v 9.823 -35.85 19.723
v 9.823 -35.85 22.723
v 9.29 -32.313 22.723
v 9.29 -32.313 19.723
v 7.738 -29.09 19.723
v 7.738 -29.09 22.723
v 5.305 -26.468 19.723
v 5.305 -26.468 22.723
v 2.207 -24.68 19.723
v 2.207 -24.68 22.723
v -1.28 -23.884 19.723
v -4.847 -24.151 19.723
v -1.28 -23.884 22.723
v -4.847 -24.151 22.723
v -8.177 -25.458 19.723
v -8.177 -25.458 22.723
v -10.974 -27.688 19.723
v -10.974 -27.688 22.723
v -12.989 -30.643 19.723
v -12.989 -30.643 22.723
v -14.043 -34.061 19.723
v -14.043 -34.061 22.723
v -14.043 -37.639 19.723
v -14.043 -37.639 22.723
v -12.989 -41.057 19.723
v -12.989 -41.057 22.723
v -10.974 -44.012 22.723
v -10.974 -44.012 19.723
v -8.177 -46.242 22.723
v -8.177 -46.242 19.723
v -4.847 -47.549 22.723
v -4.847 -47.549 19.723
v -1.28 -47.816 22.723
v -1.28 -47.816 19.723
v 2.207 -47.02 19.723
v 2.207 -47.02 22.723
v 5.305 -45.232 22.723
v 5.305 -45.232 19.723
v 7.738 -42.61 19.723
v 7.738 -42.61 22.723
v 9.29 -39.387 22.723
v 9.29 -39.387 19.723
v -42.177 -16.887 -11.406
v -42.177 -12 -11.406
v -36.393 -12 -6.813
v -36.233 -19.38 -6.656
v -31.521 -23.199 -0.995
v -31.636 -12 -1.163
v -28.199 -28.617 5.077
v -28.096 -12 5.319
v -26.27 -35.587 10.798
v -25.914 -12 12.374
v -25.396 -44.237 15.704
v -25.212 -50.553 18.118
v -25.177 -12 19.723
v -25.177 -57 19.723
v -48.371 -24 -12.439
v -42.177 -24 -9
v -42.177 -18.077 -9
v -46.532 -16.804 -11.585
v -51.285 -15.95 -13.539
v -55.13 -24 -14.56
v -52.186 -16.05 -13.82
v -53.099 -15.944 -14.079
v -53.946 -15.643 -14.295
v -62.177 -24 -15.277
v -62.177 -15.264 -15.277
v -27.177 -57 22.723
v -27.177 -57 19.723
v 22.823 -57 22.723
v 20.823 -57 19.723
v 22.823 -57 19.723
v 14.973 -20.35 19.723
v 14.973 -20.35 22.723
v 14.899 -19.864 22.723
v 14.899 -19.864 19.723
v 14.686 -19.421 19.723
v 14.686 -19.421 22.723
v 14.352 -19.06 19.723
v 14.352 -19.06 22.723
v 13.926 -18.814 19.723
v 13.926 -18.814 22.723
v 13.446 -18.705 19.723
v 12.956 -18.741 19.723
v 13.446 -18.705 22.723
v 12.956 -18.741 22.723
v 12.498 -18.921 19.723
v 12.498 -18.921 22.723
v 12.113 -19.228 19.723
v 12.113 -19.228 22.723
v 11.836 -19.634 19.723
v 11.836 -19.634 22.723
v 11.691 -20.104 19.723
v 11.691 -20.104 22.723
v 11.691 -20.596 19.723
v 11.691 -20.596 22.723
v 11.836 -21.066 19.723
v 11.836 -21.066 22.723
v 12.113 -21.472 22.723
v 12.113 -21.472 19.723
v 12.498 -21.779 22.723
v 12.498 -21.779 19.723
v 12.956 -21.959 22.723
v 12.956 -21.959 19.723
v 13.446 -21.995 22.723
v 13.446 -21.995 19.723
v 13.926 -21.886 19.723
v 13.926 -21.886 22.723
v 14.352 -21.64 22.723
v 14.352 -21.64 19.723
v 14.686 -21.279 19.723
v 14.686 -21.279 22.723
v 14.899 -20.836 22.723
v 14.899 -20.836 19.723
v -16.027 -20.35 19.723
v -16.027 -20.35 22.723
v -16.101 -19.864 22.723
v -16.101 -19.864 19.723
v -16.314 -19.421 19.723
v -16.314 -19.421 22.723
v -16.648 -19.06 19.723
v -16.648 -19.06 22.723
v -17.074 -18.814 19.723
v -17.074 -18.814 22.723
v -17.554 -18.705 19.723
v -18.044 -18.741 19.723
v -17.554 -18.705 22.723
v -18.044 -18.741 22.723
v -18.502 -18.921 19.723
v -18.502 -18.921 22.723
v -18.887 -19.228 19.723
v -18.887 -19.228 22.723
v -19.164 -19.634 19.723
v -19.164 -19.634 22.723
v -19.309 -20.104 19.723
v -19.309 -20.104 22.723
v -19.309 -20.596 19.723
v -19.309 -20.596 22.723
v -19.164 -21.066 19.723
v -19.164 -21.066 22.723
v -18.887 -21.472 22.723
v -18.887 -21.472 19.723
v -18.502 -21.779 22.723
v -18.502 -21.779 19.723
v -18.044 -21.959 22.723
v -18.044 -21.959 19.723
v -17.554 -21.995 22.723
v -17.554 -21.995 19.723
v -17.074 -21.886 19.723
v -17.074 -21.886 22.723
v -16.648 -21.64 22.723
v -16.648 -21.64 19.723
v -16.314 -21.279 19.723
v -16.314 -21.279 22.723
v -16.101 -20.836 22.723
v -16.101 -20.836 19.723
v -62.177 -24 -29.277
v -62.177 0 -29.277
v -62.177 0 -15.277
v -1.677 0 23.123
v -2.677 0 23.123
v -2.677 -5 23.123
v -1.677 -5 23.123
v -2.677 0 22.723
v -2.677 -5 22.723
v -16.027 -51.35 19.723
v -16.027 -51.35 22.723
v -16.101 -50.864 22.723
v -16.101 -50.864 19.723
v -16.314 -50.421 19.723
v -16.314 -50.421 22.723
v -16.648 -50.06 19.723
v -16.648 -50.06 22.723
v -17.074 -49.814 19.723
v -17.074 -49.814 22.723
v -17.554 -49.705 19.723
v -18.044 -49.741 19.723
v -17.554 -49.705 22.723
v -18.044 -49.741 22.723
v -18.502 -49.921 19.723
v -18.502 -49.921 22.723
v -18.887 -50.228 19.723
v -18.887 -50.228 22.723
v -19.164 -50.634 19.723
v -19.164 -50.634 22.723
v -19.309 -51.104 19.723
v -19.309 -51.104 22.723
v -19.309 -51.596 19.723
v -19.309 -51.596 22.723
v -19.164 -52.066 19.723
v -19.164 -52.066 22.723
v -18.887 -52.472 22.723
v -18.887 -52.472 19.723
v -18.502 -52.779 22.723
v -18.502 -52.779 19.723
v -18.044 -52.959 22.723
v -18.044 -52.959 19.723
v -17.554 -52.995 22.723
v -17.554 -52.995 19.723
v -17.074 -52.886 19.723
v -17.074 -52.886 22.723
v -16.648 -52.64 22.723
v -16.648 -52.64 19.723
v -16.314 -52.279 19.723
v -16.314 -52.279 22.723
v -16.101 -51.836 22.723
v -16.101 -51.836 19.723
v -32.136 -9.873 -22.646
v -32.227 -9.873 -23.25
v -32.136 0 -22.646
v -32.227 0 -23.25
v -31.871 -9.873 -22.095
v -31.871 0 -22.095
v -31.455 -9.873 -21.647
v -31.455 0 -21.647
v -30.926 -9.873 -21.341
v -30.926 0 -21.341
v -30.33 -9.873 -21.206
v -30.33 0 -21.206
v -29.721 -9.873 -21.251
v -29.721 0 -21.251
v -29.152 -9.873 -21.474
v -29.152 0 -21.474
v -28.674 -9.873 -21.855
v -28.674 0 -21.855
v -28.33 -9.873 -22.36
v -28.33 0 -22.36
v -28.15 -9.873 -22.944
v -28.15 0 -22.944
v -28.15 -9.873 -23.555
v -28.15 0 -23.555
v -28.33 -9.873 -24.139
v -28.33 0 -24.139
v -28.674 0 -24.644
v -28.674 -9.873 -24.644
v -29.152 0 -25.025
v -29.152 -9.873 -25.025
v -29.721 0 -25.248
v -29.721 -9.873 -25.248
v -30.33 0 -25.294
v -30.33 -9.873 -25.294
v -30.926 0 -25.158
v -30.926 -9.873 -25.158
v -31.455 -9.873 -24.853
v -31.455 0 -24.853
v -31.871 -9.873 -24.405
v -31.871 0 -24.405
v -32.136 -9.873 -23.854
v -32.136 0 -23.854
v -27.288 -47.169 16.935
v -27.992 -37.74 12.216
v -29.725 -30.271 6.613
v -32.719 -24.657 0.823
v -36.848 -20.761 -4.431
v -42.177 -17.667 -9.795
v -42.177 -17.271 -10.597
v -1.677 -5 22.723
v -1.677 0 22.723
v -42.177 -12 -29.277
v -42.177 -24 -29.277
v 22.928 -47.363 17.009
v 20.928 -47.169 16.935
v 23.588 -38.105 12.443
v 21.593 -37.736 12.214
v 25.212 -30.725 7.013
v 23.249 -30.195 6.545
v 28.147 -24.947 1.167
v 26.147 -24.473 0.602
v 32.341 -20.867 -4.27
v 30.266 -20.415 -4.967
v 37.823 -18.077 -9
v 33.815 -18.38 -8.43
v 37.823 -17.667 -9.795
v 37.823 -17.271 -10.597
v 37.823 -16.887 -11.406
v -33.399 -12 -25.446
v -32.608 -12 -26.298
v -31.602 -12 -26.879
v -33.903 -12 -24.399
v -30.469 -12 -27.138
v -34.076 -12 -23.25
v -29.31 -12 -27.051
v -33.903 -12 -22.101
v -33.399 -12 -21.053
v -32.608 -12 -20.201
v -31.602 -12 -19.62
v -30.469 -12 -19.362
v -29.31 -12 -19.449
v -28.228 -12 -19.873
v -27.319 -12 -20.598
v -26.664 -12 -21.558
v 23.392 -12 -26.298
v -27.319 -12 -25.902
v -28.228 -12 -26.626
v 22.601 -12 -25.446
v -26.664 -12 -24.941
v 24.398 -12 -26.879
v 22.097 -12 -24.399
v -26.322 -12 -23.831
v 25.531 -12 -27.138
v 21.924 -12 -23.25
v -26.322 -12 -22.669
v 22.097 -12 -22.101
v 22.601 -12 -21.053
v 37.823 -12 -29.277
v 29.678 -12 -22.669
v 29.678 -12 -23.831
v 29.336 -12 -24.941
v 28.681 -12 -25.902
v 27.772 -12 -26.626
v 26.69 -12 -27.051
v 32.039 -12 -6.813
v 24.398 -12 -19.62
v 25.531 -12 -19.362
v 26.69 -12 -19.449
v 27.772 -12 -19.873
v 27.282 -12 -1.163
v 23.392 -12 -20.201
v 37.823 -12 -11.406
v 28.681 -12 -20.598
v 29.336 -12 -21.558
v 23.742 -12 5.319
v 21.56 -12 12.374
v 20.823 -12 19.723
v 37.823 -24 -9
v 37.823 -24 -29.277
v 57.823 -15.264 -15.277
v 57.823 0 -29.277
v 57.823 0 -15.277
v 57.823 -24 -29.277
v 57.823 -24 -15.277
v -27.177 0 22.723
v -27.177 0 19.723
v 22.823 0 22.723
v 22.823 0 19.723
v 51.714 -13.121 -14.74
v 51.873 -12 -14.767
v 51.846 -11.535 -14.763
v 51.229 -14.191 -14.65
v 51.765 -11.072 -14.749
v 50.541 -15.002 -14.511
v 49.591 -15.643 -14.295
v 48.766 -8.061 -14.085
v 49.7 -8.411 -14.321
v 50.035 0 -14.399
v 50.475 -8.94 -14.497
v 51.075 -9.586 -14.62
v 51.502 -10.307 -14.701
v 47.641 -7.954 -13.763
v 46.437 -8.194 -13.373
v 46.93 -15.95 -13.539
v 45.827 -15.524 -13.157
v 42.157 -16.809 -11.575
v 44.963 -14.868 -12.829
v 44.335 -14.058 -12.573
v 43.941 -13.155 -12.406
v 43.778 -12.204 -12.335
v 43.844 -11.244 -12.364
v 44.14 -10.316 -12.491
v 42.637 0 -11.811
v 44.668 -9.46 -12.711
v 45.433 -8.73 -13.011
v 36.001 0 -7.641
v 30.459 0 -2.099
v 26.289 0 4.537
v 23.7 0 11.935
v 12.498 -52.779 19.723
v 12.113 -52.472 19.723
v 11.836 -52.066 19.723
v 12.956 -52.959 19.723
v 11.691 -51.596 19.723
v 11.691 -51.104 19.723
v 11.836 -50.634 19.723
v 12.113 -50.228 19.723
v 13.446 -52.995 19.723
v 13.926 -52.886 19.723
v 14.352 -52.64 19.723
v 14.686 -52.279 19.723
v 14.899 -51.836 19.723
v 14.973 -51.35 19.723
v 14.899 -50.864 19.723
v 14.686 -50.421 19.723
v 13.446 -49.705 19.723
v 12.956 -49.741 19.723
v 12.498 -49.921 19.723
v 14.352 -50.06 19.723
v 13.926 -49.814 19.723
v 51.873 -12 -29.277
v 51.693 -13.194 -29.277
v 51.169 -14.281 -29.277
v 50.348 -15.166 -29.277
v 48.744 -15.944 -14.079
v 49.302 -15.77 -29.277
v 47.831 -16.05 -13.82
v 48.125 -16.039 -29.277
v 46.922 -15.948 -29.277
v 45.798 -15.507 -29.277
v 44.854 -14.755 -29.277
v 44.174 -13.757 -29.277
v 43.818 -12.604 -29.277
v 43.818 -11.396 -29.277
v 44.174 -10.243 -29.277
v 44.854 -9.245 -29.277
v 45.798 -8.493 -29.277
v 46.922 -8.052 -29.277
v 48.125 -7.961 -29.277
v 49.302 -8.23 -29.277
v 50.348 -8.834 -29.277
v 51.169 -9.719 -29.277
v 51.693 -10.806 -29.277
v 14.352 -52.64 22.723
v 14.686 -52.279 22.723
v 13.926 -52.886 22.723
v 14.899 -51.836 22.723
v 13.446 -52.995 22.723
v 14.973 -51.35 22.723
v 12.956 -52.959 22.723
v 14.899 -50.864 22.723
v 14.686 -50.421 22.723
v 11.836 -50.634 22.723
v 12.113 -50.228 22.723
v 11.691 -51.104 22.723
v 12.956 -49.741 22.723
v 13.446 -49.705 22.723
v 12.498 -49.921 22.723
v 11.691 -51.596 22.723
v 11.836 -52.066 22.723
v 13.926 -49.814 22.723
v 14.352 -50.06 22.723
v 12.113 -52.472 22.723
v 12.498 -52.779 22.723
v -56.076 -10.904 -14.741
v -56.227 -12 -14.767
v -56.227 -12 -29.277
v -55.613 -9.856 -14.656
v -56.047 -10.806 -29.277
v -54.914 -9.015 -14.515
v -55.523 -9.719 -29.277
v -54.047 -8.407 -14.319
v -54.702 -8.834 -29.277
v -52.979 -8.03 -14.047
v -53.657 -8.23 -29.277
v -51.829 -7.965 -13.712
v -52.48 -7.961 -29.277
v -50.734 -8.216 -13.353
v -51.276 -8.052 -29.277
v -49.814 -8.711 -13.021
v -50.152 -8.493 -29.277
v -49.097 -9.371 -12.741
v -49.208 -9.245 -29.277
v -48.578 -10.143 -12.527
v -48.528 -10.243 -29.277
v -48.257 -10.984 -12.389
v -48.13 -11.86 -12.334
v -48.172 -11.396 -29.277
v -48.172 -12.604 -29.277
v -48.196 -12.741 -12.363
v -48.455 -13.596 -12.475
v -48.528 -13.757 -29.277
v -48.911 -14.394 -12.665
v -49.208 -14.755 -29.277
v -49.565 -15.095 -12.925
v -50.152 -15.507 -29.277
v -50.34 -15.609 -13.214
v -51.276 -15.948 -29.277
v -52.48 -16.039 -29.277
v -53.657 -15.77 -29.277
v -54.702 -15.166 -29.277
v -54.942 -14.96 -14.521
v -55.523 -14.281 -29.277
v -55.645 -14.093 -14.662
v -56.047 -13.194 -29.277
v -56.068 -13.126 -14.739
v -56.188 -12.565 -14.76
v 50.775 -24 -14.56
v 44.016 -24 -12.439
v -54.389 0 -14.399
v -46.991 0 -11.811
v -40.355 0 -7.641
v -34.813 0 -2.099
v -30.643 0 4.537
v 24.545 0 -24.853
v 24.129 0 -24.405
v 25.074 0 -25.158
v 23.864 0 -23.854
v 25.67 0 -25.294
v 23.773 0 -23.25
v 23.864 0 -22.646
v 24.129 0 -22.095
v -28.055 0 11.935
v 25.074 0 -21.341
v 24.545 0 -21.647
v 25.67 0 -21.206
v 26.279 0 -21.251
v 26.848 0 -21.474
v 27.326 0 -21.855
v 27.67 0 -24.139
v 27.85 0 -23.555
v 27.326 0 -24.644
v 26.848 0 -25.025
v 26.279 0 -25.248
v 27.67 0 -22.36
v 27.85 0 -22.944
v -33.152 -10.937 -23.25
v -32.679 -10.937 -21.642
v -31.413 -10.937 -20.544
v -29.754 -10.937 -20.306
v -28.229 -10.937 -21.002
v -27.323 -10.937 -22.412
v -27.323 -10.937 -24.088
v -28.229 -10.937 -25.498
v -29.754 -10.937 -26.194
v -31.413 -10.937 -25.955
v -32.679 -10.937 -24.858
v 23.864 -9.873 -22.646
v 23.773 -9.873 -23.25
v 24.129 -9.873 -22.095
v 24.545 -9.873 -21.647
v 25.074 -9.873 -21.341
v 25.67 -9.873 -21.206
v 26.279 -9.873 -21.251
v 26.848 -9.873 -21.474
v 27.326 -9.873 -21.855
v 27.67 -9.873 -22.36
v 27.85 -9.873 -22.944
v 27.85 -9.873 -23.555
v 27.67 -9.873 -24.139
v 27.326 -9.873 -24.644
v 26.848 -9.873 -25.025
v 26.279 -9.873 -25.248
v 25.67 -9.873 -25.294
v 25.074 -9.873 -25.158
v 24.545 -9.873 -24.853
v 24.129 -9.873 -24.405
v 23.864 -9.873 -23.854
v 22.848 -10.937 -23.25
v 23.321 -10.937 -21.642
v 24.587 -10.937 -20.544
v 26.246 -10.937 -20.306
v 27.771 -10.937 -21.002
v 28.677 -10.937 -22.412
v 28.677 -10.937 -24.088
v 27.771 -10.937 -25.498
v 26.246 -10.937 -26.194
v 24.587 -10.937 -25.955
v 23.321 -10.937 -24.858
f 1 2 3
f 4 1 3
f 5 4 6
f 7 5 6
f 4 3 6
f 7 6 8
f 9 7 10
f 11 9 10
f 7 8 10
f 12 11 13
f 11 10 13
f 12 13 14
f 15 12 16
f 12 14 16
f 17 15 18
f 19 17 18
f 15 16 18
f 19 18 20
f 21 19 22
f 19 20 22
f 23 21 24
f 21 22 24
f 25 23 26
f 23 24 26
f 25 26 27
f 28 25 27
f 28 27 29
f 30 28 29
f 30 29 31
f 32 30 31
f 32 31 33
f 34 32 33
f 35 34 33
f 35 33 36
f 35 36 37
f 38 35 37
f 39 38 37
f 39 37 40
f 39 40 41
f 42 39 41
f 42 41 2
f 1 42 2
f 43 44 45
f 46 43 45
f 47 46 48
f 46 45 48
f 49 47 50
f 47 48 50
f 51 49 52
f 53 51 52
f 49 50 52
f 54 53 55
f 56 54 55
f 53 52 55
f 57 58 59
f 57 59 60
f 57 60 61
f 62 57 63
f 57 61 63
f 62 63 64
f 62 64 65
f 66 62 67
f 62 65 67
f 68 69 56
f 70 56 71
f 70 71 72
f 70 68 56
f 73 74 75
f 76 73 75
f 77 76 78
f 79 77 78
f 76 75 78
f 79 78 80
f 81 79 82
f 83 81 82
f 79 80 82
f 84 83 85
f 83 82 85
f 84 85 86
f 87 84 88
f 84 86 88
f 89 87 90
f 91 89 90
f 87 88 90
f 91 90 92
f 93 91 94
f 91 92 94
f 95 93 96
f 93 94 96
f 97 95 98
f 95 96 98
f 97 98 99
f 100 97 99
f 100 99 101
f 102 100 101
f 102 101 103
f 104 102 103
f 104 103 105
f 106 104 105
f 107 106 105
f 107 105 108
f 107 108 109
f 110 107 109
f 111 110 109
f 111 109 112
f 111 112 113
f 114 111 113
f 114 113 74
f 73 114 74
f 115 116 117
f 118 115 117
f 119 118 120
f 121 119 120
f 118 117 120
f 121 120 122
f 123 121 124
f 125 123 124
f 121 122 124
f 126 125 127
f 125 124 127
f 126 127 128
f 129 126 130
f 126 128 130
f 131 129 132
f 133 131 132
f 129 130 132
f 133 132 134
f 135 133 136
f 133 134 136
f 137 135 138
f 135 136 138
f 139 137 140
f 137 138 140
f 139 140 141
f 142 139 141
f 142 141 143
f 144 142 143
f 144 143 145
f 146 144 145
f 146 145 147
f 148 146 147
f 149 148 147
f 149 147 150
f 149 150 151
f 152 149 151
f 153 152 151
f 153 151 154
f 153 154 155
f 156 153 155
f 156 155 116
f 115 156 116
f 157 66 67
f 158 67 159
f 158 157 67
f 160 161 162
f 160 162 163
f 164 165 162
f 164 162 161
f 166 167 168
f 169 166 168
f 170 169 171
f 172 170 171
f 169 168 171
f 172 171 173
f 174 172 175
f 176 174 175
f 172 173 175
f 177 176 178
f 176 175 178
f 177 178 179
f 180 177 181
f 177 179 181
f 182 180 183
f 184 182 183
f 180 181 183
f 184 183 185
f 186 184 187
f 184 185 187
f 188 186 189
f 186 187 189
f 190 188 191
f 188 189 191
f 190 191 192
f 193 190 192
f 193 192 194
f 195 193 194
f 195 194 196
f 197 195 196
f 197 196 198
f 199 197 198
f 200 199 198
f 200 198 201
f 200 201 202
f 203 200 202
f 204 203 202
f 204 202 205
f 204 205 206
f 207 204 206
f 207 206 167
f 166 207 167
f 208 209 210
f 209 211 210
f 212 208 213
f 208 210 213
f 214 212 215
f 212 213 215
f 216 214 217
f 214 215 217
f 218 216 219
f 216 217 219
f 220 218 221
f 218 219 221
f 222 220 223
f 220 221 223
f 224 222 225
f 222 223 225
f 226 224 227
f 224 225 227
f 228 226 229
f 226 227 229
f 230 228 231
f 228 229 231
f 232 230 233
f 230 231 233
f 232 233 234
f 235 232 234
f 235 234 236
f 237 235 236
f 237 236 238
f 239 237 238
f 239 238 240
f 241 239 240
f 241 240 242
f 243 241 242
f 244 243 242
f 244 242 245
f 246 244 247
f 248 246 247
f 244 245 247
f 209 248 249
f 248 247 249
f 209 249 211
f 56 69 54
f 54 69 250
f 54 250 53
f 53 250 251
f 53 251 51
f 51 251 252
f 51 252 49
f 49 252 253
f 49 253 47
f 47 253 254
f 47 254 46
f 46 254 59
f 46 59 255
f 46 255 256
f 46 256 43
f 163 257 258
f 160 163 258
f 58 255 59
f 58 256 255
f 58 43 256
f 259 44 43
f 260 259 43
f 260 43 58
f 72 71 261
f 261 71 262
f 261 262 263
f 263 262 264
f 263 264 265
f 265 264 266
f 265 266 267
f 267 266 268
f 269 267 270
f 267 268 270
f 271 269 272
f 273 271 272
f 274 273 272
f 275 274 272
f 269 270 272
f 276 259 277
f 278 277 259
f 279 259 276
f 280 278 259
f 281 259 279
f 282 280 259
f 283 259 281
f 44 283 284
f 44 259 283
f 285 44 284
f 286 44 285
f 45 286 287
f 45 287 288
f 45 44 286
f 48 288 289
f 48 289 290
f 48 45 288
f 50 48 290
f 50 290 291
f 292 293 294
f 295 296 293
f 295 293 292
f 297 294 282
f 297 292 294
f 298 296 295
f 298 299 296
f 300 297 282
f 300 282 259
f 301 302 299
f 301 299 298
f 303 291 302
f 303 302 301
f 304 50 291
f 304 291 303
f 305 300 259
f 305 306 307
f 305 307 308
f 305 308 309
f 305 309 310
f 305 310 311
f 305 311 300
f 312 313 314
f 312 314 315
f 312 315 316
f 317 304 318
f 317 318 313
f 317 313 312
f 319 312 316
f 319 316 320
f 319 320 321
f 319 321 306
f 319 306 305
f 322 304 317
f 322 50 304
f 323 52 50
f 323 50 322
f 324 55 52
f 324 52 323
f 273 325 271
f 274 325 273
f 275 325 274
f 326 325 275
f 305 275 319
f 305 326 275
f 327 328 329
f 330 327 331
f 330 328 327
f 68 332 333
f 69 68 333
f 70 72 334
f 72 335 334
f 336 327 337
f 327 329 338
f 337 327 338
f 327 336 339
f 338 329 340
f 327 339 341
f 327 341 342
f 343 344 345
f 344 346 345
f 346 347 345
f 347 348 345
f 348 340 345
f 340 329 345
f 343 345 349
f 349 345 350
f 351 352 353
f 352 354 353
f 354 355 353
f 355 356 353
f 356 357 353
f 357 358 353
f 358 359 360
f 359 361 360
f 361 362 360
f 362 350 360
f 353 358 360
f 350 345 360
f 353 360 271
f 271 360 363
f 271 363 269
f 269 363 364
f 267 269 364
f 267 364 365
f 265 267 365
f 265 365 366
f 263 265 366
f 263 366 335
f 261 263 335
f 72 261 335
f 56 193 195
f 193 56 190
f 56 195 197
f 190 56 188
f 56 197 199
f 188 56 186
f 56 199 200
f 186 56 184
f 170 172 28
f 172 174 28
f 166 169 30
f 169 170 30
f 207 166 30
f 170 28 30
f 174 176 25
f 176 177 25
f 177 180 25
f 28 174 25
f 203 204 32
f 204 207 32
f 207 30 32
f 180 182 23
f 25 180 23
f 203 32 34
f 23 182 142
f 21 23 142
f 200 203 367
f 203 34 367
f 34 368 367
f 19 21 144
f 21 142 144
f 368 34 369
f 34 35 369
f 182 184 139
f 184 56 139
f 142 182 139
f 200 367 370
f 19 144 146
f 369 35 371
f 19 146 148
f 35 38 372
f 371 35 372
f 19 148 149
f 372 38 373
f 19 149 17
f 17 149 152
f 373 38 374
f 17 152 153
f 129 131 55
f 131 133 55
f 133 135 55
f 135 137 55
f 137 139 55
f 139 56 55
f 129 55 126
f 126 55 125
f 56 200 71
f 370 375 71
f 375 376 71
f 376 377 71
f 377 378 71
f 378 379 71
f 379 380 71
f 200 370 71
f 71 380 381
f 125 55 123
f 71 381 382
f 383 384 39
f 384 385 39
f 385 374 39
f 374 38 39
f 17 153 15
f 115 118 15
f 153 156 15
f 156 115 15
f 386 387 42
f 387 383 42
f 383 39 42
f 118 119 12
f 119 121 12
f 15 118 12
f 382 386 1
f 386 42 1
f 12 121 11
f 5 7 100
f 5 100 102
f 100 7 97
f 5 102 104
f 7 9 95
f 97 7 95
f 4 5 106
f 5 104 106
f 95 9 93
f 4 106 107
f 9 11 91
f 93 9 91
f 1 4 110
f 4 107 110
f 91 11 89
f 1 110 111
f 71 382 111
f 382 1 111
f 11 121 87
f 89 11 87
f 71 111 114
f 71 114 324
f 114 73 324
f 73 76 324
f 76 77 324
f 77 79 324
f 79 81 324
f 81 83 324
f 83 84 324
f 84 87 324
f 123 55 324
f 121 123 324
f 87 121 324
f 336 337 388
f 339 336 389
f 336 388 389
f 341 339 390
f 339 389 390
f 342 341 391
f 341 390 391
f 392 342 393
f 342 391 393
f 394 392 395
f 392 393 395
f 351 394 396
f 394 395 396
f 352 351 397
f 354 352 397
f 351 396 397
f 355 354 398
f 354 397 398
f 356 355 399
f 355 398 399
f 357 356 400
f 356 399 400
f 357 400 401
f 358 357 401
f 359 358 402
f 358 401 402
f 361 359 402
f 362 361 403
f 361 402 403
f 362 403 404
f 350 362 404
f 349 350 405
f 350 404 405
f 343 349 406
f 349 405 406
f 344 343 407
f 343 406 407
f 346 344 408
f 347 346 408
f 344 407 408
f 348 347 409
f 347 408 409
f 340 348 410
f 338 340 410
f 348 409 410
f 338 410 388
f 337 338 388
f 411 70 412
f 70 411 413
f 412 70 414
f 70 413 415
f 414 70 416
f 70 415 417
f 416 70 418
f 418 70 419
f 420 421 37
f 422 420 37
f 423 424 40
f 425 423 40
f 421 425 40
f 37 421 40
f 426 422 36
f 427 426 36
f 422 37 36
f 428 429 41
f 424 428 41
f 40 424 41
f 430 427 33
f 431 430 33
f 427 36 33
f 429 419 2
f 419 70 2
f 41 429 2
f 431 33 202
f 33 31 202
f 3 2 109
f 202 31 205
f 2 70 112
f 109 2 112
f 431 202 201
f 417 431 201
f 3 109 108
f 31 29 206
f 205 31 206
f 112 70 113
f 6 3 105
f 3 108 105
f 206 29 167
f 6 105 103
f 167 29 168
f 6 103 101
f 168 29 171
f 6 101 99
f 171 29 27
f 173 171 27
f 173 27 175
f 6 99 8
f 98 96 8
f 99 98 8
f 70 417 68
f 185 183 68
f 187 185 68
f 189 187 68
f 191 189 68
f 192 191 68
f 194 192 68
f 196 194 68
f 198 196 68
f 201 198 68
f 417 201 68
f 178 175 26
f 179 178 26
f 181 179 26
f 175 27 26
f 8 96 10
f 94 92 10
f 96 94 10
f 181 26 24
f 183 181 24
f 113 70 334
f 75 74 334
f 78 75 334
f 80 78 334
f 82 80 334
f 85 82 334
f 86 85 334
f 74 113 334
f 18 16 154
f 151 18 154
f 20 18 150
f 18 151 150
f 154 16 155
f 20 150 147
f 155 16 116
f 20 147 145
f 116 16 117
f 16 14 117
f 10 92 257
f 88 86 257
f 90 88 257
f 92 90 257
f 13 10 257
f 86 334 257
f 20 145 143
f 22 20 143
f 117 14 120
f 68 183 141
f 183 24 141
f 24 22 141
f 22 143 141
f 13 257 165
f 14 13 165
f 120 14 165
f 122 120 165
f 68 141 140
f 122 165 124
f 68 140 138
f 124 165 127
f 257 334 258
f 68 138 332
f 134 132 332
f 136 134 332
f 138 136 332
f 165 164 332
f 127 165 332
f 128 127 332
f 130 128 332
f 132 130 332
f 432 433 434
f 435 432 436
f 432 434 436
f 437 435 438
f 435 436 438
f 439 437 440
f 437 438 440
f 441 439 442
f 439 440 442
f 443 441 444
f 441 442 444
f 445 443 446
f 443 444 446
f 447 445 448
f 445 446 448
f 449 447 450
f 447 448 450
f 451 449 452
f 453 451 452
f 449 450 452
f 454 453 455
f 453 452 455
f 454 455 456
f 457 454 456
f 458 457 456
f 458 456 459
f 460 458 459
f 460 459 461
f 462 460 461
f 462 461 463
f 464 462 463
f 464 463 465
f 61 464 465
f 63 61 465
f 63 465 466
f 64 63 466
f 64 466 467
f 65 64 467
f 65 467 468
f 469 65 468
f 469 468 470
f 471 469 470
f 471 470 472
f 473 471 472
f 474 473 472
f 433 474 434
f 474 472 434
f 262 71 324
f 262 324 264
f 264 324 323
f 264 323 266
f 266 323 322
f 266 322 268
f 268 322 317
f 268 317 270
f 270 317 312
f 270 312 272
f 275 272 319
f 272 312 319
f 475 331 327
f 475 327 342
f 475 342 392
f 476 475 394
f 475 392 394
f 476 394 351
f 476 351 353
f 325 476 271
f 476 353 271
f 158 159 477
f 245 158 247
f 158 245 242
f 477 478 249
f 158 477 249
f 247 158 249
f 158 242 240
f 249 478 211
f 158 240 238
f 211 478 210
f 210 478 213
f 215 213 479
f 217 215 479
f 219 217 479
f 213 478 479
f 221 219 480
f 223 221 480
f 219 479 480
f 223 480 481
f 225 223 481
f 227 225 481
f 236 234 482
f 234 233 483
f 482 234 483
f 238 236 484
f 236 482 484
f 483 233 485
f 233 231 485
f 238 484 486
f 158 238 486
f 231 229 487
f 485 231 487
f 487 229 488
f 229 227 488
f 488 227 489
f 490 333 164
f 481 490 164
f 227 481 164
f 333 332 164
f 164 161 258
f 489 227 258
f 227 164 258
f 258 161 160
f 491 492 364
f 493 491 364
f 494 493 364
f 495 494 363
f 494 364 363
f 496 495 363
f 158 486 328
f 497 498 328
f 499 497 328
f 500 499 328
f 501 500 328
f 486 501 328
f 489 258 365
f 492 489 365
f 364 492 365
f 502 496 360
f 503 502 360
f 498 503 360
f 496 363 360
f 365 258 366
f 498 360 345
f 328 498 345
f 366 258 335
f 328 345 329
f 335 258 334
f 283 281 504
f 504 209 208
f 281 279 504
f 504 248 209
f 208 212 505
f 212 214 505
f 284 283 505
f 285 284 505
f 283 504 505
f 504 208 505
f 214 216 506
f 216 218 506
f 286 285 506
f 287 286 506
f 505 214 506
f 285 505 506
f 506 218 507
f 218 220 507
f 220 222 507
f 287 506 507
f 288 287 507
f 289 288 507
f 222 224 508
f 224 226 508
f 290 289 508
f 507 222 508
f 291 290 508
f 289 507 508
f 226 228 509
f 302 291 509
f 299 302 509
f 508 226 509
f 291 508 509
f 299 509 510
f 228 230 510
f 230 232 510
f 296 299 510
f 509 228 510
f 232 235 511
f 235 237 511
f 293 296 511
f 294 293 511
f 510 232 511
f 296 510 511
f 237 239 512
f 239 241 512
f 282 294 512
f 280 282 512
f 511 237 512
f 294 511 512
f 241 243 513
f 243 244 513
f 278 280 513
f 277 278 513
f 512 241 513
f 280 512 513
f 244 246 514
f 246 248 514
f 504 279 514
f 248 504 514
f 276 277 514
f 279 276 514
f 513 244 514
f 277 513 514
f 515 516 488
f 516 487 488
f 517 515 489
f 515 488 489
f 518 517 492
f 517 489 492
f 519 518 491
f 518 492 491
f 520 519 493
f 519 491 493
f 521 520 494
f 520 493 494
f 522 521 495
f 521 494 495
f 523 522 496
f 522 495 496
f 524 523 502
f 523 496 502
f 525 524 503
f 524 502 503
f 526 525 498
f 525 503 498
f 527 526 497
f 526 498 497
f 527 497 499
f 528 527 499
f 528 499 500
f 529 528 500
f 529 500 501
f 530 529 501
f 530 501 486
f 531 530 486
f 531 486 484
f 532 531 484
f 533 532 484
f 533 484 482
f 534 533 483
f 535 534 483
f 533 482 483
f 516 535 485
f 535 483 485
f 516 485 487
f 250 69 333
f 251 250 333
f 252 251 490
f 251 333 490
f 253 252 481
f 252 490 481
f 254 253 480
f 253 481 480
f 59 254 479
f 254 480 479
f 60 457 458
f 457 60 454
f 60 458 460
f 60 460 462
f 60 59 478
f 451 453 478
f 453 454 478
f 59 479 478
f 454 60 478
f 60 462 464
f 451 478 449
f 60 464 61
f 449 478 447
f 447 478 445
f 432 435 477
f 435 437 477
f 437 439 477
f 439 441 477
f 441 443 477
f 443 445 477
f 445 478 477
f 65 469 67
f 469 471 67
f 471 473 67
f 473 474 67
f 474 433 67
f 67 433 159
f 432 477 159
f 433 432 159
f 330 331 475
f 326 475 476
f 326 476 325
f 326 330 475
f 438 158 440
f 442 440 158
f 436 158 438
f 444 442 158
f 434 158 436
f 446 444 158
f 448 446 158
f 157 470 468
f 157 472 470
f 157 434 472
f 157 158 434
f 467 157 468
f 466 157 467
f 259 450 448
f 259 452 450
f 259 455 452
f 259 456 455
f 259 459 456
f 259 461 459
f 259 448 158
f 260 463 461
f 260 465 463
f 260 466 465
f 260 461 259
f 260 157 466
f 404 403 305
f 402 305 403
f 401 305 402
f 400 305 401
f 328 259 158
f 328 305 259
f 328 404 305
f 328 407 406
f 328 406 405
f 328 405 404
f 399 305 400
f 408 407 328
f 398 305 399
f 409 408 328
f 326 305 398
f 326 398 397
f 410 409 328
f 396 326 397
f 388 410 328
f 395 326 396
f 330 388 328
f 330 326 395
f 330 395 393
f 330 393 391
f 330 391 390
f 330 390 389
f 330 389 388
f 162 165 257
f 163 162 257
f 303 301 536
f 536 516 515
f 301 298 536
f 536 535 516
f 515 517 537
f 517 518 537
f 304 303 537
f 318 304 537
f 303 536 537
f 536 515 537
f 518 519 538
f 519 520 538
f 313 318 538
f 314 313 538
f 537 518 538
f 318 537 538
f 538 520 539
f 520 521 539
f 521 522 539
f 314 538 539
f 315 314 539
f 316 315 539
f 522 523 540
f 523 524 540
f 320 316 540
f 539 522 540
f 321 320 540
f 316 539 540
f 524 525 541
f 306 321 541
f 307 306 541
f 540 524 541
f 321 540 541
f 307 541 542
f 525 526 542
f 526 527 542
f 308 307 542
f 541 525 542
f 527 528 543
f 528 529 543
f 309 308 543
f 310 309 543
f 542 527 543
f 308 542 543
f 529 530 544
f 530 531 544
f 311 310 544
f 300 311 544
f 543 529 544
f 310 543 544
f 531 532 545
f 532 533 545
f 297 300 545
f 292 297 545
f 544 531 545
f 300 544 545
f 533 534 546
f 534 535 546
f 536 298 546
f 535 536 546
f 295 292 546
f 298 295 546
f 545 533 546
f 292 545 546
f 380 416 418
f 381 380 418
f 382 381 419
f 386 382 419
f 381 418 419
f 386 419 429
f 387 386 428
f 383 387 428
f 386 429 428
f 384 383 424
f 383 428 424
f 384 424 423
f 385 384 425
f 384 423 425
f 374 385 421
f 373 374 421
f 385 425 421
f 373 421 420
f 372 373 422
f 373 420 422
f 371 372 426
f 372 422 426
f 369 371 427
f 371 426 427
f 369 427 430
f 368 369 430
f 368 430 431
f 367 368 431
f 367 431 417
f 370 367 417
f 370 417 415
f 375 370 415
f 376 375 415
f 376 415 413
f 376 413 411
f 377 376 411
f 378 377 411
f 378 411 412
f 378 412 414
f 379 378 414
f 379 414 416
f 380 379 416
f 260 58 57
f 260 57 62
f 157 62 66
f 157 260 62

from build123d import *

# Parameters (mm, degrees)
F0_W           = 50
F0_H           = 3
F1_DEPTH       = 12
F3_DEPTH       = 45
F5_DEPTH       = 120.001
F6_R           = 12
F6_R_2         = 1.65
F7_DEPTH       = 25
F9_D           = 4.1000000042
F9_CSINK_D     = 7.7978
F9_CSINK_ANGLE = 82
F10_W          = 1
F10_H          = 5
F11_DEPTH      = 0.4
F13_END_RADIUS = 35
F13_REACH      = 75.7248075794
F14_END_RADIUS = 35
F14_REACH      = 75.7248075794
F15_DEPTH      = 25


with BuildPart() as f1:
    # F0 (on Front) → F1 (new body)
    with BuildSketch(Plane.XZ):
        with BuildLine():
            Line((22.8227958083, 19.723181963), (-27.1772041917, 19.723181963))
            ThreePointArc((-27.1772041917, 19.723181963), (-37.4284668502, -5.0255553786), (-62.1772041917, -15.276818037))
            Line((-62.1772041917, -15.276818037), (-62.1772041917, -29.276818037))
            Line((-62.1772041917, -29.276818037), (57.8227958083, -29.276818037))
            Line((57.8227958083, -29.276818037), (57.8227958083, -15.276818037))
            ThreePointArc((57.8227958083, -15.276818037), (33.0740584668, -5.0255553786), (22.8227958083, 19.723181963))
        make_face()
        with Locations((-2.1772041917, 21.223181963)):
            Rectangle(F0_W, F0_H)
    extrude(amount=F1_DEPTH)

    # F2 (on face) → F3 (join)
    with BuildSketch(Plane.XZ.offset(12)):
        with BuildLine():
            Line((-25.1772041917, 19.723181963), (-27.1772041917, 19.723181963))
            ThreePointArc((-27.1772041917, 19.723181963), (-37.4284668502, -5.0255553786), (-62.1772041917, -15.276818037))
            Line((-62.1772041917, -15.276818037), (-62.1772041917, -29.276818037))
            Line((-62.1772041917, -29.276818037), (-60.1772041917, -29.276818037))
            Line((-60.1772041917, -29.276818037), (-60.1772041917, -17.2227244409))
            ThreePointArc((-60.1772041917, -17.2227244409), (-35.3164521546, -5.722839337), (-25.1772041917, 19.723181963))
        make_face()
        Polygon((-27.1772041917, 22.723181963), (-27.1772041917, 19.723181963), (-25.1772041917, 19.723181963), (20.8227958083, 19.723181963), (22.8227958083, 19.723181963), (22.8227958083, 22.723181963), align=None)
        with BuildLine():
            Line((22.8227958083, 19.723181963), (20.8227958083, 19.723181963))
            ThreePointArc((20.8227958083, 19.723181963), (30.9620437712, -5.722839337), (55.8227958083, -17.2227244409))
            Line((55.8227958083, -17.2227244409), (55.8227958083, -29.276818037))
            Line((55.8227958083, -29.276818037), (57.8227958083, -29.276818037))
            Line((57.8227958083, -29.276818037), (57.8227958083, -15.276818037))
            ThreePointArc((57.8227958083, -15.276818037), (33.0740584668, -5.0255553786), (22.8227958083, 19.723181963))
        make_face()
    extrude(amount=F3_DEPTH)

    # F4 (on face) → F5 (cut, through all)
    with BuildSketch(Plane(origin=(-62.1772041917, 0, 0), x_dir=(0, -1, 0), z_dir=(-1, 0, 0))):
        with BuildLine():
            Line((57, -15.276818037), (57, 19.723181963))
            ThreePointArc((57, 19.723181963), (26.3280584166, 2.7280262742), (12, -29.276818037))
            Line((12, -29.276818037), (57, -29.276818037))
            Line((57, -29.276818037), (57, -15.276818037))
        make_face()
    extrude(amount=-F5_DEPTH, mode=Mode.SUBTRACT)

    # F6 (on face) → F7 (cut)
    with BuildSketch(Plane.XY.offset(22.723181963)):
        with Locations((-2.1772041917, -35.85)):
            Circle(F6_R)
        with Locations((-17.6772041917, -51.35)):
            Circle(F6_R_2)
        with Locations((-17.6772041917, -20.35)):
            Circle(F6_R_2)
        with Locations((13.3227958083, -51.35)):
            Circle(F6_R_2)
        with Locations((13.3227958083, -20.35)):
            Circle(F6_R_2)
    extrude(amount=-F7_DEPTH, mode=Mode.SUBTRACT)

    # F9 (through all)
    with Locations(Plane.XZ.offset(12)):
        with Locations((-30.1772041917, -23.2497712389), (25.8227958083, -23.2497712389)):
            CounterSinkHole(F9_D / 2, F9_CSINK_D / 2, counter_sink_angle=F9_CSINK_ANGLE)

    # F10 (on face) → F11 (join)
    with BuildSketch(Plane.XY.offset(22.723181963)):
        with Locations((-2.1772041917, -2.5)):
            Rectangle(F10_W, F10_H)
    extrude(amount=F11_DEPTH)

    f13_end = (Plane(origin=(-62.1772041917, -28.5, 19.723181963), x_dir=(0, 0, 1), z_dir=(0, 1, 0)) * Cylinder(F13_END_RADIUS, 437.0700631752, mode=Mode.PRIVATE)).faces().sort_by_distance((-37.4284668502, -0.7549172174, -5.0255553786))[0]
    # F12 (on face) → F13 (join, up to the whole of a round face its end follows)
    with BuildSketch(Plane(origin=(0, 0, -29.276818037), x_dir=(1, 0, 0), z_dir=(0, 0, -1))):
        with BuildLine():
            Line((-62.1772041917, 24), (-62.1772041917, 12))
            Line((-62.1772041917, 12), (-60.1772041917, 12))
            Line((-60.1772041917, 12), (-56.2272041917, 12))
            ThreePointArc((-56.2272041917, 12), (-52.1772041917, 16.05), (-48.1272041917, 12))
            Line((-48.1272041917, 12), (-42.1772041917, 12))
            Line((-42.1772041917, 12), (-42.1772041917, 24))
            Line((-42.1772041917, 24), (-62.1772041917, 24))
        make_face()
        with BuildLine():
            Line((-56.2272041917, 12), (-48.1272041917, 12))
            ThreePointArc((-48.1272041917, 12), (-52.1772041917, 16.05), (-56.2272041917, 12))
        make_face()
    f13_long = extrude(amount=-F13_REACH, mode=Mode.PRIVATE)
    add(split(f13_long, bisect_by=f13_end, keep=Keep.TOP, mode=Mode.PRIVATE))

    f14_end = (Plane(origin=(57.8227958083, -28.5, 19.723181963), x_dir=(0, 0, 1), z_dir=(0, 1, 0)) * Cylinder(F14_END_RADIUS, 437.0700631752, mode=Mode.PRIVATE)).faces().sort_by_distance((33.0740584668, -0.7549172174, -5.0255553786))[0]
    # F12 (on face) → F14 (join, up to the whole of a round face its end follows)
    with BuildSketch(Plane(origin=(0, 0, -29.276818037), x_dir=(1, 0, 0), z_dir=(0, 0, -1))):
        with BuildLine():
            Line((37.8227958083, 24), (37.8227958083, 12))
            Line((37.8227958083, 12), (43.7727958083, 12))
            ThreePointArc((43.7727958083, 12), (47.8227958083, 16.05), (51.8727958083, 12))
            Line((51.8727958083, 12), (55.8227958083, 12))
            Line((55.8227958083, 12), (57.8227958083, 12))
            Line((57.8227958083, 12), (57.8227958083, 24))
            Line((57.8227958083, 24), (37.8227958083, 24))
        make_face()
        with BuildLine():
            Line((51.8727958083, 12), (43.7727958083, 12))
            ThreePointArc((43.7727958083, 12), (47.8227958083, 7.95), (51.8727958083, 12))
        make_face()
    f14_long = extrude(amount=-F14_REACH, mode=Mode.PRIVATE)
    add(split(f14_long, bisect_by=f14_end, keep=Keep.TOP, mode=Mode.PRIVATE))

    # F12 (on face) → F15 (cut)
    with BuildSketch(Plane(origin=(0, 0, -29.276818037), x_dir=(1, 0, 0), z_dir=(0, 0, -1))):
        with BuildLine():
            Line((-56.2272041917, 12), (-48.1272041917, 12))
            ThreePointArc((-48.1272041917, 12), (-52.1772041917, 16.05), (-56.2272041917, 12))
        make_face()
        with BuildLine():
            ThreePointArc((-56.2272041917, 12), (-52.1772041917, 7.95), (-48.1272041917, 12))
            Line((-48.1272041917, 12), (-56.2272041917, 12))
        make_face()
        with BuildLine():
            Line((51.8727958083, 12), (43.7727958083, 12))
            ThreePointArc((43.7727958083, 12), (47.8227958083, 7.95), (51.8727958083, 12))
        make_face()
        with BuildLine():
            ThreePointArc((51.8727958083, 12), (47.8227958083, 16.05), (43.7727958083, 12))
            Line((43.7727958083, 12), (51.8727958083, 12))
        make_face()
    extrude(amount=-F15_DEPTH, mode=Mode.SUBTRACT)


solid = f1.part
